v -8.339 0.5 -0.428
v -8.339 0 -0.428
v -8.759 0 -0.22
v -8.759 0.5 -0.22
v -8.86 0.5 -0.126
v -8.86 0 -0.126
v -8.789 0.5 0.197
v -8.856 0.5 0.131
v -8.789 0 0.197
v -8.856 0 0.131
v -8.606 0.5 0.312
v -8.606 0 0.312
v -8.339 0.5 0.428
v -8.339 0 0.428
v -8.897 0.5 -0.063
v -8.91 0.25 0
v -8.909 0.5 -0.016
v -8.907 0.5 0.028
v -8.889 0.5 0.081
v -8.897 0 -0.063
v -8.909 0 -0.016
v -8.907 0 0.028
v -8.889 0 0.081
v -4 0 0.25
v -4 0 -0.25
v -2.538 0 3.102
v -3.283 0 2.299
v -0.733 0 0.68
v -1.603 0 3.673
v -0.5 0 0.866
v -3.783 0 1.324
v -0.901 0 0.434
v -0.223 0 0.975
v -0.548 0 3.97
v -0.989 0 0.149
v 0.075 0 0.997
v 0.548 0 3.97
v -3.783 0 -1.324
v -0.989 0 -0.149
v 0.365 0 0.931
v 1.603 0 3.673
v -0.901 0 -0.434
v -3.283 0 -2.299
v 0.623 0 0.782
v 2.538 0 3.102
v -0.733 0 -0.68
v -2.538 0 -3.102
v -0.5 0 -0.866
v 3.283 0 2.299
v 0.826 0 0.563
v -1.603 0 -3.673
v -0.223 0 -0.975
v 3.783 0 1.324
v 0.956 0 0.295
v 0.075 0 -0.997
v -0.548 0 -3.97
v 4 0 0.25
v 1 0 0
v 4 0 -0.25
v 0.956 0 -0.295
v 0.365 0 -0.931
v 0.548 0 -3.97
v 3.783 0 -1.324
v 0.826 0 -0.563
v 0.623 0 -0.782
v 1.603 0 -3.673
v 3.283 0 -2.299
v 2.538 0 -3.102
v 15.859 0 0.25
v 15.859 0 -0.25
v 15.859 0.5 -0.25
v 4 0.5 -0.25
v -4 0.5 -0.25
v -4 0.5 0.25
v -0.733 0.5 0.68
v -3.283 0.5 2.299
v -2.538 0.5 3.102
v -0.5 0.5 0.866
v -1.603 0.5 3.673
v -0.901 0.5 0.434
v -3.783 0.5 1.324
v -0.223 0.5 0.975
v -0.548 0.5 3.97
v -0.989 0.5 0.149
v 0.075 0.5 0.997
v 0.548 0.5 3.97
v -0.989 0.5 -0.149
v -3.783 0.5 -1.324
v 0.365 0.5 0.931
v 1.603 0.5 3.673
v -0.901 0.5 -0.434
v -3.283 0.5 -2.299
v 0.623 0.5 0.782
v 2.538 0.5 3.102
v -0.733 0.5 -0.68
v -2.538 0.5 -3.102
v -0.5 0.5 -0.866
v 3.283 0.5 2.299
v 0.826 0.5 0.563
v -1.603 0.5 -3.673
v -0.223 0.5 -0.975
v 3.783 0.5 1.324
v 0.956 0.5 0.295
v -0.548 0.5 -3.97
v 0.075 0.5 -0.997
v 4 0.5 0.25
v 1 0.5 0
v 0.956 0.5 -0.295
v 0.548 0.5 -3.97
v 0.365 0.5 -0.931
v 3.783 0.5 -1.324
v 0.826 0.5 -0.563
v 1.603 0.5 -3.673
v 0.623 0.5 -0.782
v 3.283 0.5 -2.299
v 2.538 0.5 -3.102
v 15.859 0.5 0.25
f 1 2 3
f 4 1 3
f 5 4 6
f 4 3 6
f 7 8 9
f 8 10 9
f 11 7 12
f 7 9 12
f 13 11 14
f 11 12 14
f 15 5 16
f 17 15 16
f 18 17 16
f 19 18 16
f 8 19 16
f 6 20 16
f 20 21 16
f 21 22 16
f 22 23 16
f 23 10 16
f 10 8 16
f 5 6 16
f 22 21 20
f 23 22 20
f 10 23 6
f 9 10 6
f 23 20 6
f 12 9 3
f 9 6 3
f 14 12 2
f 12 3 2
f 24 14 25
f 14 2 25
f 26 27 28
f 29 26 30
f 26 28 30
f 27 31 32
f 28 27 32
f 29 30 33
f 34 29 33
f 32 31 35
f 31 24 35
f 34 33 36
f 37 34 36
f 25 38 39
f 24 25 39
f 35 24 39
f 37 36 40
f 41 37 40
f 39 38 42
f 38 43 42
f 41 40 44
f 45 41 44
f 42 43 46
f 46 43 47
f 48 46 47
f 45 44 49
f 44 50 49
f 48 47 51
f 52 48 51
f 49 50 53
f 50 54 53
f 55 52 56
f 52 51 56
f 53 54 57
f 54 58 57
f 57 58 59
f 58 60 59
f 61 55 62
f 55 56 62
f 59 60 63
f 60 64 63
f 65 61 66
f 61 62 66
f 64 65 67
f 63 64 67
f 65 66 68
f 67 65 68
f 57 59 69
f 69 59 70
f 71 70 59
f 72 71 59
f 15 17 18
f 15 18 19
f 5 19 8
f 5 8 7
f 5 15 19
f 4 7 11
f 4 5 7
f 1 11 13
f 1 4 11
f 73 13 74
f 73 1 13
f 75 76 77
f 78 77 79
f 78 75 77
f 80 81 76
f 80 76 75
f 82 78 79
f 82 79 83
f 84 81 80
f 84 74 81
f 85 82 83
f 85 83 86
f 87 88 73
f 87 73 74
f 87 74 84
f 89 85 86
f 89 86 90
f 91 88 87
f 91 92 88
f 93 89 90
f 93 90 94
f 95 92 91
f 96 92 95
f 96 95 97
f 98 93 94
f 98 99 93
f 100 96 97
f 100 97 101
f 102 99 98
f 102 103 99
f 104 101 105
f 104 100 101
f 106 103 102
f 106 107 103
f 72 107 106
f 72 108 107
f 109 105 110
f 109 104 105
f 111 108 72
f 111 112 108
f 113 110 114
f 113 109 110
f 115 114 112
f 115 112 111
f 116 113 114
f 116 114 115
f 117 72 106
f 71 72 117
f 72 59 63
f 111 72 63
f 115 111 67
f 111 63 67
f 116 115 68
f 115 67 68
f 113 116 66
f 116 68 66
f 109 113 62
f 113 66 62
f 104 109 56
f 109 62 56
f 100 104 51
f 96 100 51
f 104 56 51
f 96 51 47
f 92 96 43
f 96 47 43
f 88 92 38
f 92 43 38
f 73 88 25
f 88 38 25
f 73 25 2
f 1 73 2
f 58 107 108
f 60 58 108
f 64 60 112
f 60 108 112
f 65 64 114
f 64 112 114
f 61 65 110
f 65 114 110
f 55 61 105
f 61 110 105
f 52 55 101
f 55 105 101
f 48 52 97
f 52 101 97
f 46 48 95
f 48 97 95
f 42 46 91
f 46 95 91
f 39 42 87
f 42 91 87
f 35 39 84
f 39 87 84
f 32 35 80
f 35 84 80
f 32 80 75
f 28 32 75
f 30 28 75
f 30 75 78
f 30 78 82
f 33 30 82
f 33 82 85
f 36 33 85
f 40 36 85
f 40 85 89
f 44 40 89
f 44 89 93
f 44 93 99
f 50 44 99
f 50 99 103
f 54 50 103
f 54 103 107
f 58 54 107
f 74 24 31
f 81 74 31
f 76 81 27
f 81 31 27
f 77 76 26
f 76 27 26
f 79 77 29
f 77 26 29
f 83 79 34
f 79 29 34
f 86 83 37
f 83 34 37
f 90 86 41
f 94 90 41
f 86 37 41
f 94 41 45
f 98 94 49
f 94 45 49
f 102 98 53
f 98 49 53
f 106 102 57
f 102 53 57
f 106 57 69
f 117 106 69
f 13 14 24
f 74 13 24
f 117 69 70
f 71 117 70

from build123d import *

# Parameters (mm, degrees)
BOSS_EXTRUDE2_DEPTH = 0.5
SKETCH3_R           = 1
CUT_EXTRUDE2_DEPTH  = 1.5000001


with BuildPart() as part:
    # Sketch1 → Boss-Extrude2 (new body)
    with BuildSketch(Plane(origin=(0, 0, 0), x_dir=(1, 0, 0), z_dir=(0, 1, 0))):
        with BuildLine():
            Line((15.859342687, 0.25), (4, 0.25))
            ThreePointArc((4, 0.25), (0, 4.007804885), (-4, 0.25))
            Line((-4, 0.25), (-8.33886799, 0.428130321))
            add(Edge.make_bspline(
                [(-8.33886799, 0.428130321), (-9.480171403, 0), (-8.33886799, -0.428130321)],
                knots=[0, 0, 0, 1, 1, 1], degree=2))
            Line((-8.33886799, -0.428130321), (-4, -0.25))
            ThreePointArc((-4, -0.25), (0, -4.007804885), (4, -0.25))
            Line((4, -0.25), (15.859342687, -0.25))
            Line((15.859342687, -0.25), (15.859342687, 0.25))
        make_face()
    extrude(amount=BOSS_EXTRUDE2_DEPTH)

    # Sketch3 → Cut-Extrude2 (cut, through all)
    with BuildSketch(Plane(origin=(0, 0.5, 0), x_dir=(1, 0, 0), z_dir=(0, 1, 0))):
        Circle(SKETCH3_R)
    extrude(amount=-CUT_EXTRUDE2_DEPTH, mode=Mode.SUBTRACT)


solid = part.part
